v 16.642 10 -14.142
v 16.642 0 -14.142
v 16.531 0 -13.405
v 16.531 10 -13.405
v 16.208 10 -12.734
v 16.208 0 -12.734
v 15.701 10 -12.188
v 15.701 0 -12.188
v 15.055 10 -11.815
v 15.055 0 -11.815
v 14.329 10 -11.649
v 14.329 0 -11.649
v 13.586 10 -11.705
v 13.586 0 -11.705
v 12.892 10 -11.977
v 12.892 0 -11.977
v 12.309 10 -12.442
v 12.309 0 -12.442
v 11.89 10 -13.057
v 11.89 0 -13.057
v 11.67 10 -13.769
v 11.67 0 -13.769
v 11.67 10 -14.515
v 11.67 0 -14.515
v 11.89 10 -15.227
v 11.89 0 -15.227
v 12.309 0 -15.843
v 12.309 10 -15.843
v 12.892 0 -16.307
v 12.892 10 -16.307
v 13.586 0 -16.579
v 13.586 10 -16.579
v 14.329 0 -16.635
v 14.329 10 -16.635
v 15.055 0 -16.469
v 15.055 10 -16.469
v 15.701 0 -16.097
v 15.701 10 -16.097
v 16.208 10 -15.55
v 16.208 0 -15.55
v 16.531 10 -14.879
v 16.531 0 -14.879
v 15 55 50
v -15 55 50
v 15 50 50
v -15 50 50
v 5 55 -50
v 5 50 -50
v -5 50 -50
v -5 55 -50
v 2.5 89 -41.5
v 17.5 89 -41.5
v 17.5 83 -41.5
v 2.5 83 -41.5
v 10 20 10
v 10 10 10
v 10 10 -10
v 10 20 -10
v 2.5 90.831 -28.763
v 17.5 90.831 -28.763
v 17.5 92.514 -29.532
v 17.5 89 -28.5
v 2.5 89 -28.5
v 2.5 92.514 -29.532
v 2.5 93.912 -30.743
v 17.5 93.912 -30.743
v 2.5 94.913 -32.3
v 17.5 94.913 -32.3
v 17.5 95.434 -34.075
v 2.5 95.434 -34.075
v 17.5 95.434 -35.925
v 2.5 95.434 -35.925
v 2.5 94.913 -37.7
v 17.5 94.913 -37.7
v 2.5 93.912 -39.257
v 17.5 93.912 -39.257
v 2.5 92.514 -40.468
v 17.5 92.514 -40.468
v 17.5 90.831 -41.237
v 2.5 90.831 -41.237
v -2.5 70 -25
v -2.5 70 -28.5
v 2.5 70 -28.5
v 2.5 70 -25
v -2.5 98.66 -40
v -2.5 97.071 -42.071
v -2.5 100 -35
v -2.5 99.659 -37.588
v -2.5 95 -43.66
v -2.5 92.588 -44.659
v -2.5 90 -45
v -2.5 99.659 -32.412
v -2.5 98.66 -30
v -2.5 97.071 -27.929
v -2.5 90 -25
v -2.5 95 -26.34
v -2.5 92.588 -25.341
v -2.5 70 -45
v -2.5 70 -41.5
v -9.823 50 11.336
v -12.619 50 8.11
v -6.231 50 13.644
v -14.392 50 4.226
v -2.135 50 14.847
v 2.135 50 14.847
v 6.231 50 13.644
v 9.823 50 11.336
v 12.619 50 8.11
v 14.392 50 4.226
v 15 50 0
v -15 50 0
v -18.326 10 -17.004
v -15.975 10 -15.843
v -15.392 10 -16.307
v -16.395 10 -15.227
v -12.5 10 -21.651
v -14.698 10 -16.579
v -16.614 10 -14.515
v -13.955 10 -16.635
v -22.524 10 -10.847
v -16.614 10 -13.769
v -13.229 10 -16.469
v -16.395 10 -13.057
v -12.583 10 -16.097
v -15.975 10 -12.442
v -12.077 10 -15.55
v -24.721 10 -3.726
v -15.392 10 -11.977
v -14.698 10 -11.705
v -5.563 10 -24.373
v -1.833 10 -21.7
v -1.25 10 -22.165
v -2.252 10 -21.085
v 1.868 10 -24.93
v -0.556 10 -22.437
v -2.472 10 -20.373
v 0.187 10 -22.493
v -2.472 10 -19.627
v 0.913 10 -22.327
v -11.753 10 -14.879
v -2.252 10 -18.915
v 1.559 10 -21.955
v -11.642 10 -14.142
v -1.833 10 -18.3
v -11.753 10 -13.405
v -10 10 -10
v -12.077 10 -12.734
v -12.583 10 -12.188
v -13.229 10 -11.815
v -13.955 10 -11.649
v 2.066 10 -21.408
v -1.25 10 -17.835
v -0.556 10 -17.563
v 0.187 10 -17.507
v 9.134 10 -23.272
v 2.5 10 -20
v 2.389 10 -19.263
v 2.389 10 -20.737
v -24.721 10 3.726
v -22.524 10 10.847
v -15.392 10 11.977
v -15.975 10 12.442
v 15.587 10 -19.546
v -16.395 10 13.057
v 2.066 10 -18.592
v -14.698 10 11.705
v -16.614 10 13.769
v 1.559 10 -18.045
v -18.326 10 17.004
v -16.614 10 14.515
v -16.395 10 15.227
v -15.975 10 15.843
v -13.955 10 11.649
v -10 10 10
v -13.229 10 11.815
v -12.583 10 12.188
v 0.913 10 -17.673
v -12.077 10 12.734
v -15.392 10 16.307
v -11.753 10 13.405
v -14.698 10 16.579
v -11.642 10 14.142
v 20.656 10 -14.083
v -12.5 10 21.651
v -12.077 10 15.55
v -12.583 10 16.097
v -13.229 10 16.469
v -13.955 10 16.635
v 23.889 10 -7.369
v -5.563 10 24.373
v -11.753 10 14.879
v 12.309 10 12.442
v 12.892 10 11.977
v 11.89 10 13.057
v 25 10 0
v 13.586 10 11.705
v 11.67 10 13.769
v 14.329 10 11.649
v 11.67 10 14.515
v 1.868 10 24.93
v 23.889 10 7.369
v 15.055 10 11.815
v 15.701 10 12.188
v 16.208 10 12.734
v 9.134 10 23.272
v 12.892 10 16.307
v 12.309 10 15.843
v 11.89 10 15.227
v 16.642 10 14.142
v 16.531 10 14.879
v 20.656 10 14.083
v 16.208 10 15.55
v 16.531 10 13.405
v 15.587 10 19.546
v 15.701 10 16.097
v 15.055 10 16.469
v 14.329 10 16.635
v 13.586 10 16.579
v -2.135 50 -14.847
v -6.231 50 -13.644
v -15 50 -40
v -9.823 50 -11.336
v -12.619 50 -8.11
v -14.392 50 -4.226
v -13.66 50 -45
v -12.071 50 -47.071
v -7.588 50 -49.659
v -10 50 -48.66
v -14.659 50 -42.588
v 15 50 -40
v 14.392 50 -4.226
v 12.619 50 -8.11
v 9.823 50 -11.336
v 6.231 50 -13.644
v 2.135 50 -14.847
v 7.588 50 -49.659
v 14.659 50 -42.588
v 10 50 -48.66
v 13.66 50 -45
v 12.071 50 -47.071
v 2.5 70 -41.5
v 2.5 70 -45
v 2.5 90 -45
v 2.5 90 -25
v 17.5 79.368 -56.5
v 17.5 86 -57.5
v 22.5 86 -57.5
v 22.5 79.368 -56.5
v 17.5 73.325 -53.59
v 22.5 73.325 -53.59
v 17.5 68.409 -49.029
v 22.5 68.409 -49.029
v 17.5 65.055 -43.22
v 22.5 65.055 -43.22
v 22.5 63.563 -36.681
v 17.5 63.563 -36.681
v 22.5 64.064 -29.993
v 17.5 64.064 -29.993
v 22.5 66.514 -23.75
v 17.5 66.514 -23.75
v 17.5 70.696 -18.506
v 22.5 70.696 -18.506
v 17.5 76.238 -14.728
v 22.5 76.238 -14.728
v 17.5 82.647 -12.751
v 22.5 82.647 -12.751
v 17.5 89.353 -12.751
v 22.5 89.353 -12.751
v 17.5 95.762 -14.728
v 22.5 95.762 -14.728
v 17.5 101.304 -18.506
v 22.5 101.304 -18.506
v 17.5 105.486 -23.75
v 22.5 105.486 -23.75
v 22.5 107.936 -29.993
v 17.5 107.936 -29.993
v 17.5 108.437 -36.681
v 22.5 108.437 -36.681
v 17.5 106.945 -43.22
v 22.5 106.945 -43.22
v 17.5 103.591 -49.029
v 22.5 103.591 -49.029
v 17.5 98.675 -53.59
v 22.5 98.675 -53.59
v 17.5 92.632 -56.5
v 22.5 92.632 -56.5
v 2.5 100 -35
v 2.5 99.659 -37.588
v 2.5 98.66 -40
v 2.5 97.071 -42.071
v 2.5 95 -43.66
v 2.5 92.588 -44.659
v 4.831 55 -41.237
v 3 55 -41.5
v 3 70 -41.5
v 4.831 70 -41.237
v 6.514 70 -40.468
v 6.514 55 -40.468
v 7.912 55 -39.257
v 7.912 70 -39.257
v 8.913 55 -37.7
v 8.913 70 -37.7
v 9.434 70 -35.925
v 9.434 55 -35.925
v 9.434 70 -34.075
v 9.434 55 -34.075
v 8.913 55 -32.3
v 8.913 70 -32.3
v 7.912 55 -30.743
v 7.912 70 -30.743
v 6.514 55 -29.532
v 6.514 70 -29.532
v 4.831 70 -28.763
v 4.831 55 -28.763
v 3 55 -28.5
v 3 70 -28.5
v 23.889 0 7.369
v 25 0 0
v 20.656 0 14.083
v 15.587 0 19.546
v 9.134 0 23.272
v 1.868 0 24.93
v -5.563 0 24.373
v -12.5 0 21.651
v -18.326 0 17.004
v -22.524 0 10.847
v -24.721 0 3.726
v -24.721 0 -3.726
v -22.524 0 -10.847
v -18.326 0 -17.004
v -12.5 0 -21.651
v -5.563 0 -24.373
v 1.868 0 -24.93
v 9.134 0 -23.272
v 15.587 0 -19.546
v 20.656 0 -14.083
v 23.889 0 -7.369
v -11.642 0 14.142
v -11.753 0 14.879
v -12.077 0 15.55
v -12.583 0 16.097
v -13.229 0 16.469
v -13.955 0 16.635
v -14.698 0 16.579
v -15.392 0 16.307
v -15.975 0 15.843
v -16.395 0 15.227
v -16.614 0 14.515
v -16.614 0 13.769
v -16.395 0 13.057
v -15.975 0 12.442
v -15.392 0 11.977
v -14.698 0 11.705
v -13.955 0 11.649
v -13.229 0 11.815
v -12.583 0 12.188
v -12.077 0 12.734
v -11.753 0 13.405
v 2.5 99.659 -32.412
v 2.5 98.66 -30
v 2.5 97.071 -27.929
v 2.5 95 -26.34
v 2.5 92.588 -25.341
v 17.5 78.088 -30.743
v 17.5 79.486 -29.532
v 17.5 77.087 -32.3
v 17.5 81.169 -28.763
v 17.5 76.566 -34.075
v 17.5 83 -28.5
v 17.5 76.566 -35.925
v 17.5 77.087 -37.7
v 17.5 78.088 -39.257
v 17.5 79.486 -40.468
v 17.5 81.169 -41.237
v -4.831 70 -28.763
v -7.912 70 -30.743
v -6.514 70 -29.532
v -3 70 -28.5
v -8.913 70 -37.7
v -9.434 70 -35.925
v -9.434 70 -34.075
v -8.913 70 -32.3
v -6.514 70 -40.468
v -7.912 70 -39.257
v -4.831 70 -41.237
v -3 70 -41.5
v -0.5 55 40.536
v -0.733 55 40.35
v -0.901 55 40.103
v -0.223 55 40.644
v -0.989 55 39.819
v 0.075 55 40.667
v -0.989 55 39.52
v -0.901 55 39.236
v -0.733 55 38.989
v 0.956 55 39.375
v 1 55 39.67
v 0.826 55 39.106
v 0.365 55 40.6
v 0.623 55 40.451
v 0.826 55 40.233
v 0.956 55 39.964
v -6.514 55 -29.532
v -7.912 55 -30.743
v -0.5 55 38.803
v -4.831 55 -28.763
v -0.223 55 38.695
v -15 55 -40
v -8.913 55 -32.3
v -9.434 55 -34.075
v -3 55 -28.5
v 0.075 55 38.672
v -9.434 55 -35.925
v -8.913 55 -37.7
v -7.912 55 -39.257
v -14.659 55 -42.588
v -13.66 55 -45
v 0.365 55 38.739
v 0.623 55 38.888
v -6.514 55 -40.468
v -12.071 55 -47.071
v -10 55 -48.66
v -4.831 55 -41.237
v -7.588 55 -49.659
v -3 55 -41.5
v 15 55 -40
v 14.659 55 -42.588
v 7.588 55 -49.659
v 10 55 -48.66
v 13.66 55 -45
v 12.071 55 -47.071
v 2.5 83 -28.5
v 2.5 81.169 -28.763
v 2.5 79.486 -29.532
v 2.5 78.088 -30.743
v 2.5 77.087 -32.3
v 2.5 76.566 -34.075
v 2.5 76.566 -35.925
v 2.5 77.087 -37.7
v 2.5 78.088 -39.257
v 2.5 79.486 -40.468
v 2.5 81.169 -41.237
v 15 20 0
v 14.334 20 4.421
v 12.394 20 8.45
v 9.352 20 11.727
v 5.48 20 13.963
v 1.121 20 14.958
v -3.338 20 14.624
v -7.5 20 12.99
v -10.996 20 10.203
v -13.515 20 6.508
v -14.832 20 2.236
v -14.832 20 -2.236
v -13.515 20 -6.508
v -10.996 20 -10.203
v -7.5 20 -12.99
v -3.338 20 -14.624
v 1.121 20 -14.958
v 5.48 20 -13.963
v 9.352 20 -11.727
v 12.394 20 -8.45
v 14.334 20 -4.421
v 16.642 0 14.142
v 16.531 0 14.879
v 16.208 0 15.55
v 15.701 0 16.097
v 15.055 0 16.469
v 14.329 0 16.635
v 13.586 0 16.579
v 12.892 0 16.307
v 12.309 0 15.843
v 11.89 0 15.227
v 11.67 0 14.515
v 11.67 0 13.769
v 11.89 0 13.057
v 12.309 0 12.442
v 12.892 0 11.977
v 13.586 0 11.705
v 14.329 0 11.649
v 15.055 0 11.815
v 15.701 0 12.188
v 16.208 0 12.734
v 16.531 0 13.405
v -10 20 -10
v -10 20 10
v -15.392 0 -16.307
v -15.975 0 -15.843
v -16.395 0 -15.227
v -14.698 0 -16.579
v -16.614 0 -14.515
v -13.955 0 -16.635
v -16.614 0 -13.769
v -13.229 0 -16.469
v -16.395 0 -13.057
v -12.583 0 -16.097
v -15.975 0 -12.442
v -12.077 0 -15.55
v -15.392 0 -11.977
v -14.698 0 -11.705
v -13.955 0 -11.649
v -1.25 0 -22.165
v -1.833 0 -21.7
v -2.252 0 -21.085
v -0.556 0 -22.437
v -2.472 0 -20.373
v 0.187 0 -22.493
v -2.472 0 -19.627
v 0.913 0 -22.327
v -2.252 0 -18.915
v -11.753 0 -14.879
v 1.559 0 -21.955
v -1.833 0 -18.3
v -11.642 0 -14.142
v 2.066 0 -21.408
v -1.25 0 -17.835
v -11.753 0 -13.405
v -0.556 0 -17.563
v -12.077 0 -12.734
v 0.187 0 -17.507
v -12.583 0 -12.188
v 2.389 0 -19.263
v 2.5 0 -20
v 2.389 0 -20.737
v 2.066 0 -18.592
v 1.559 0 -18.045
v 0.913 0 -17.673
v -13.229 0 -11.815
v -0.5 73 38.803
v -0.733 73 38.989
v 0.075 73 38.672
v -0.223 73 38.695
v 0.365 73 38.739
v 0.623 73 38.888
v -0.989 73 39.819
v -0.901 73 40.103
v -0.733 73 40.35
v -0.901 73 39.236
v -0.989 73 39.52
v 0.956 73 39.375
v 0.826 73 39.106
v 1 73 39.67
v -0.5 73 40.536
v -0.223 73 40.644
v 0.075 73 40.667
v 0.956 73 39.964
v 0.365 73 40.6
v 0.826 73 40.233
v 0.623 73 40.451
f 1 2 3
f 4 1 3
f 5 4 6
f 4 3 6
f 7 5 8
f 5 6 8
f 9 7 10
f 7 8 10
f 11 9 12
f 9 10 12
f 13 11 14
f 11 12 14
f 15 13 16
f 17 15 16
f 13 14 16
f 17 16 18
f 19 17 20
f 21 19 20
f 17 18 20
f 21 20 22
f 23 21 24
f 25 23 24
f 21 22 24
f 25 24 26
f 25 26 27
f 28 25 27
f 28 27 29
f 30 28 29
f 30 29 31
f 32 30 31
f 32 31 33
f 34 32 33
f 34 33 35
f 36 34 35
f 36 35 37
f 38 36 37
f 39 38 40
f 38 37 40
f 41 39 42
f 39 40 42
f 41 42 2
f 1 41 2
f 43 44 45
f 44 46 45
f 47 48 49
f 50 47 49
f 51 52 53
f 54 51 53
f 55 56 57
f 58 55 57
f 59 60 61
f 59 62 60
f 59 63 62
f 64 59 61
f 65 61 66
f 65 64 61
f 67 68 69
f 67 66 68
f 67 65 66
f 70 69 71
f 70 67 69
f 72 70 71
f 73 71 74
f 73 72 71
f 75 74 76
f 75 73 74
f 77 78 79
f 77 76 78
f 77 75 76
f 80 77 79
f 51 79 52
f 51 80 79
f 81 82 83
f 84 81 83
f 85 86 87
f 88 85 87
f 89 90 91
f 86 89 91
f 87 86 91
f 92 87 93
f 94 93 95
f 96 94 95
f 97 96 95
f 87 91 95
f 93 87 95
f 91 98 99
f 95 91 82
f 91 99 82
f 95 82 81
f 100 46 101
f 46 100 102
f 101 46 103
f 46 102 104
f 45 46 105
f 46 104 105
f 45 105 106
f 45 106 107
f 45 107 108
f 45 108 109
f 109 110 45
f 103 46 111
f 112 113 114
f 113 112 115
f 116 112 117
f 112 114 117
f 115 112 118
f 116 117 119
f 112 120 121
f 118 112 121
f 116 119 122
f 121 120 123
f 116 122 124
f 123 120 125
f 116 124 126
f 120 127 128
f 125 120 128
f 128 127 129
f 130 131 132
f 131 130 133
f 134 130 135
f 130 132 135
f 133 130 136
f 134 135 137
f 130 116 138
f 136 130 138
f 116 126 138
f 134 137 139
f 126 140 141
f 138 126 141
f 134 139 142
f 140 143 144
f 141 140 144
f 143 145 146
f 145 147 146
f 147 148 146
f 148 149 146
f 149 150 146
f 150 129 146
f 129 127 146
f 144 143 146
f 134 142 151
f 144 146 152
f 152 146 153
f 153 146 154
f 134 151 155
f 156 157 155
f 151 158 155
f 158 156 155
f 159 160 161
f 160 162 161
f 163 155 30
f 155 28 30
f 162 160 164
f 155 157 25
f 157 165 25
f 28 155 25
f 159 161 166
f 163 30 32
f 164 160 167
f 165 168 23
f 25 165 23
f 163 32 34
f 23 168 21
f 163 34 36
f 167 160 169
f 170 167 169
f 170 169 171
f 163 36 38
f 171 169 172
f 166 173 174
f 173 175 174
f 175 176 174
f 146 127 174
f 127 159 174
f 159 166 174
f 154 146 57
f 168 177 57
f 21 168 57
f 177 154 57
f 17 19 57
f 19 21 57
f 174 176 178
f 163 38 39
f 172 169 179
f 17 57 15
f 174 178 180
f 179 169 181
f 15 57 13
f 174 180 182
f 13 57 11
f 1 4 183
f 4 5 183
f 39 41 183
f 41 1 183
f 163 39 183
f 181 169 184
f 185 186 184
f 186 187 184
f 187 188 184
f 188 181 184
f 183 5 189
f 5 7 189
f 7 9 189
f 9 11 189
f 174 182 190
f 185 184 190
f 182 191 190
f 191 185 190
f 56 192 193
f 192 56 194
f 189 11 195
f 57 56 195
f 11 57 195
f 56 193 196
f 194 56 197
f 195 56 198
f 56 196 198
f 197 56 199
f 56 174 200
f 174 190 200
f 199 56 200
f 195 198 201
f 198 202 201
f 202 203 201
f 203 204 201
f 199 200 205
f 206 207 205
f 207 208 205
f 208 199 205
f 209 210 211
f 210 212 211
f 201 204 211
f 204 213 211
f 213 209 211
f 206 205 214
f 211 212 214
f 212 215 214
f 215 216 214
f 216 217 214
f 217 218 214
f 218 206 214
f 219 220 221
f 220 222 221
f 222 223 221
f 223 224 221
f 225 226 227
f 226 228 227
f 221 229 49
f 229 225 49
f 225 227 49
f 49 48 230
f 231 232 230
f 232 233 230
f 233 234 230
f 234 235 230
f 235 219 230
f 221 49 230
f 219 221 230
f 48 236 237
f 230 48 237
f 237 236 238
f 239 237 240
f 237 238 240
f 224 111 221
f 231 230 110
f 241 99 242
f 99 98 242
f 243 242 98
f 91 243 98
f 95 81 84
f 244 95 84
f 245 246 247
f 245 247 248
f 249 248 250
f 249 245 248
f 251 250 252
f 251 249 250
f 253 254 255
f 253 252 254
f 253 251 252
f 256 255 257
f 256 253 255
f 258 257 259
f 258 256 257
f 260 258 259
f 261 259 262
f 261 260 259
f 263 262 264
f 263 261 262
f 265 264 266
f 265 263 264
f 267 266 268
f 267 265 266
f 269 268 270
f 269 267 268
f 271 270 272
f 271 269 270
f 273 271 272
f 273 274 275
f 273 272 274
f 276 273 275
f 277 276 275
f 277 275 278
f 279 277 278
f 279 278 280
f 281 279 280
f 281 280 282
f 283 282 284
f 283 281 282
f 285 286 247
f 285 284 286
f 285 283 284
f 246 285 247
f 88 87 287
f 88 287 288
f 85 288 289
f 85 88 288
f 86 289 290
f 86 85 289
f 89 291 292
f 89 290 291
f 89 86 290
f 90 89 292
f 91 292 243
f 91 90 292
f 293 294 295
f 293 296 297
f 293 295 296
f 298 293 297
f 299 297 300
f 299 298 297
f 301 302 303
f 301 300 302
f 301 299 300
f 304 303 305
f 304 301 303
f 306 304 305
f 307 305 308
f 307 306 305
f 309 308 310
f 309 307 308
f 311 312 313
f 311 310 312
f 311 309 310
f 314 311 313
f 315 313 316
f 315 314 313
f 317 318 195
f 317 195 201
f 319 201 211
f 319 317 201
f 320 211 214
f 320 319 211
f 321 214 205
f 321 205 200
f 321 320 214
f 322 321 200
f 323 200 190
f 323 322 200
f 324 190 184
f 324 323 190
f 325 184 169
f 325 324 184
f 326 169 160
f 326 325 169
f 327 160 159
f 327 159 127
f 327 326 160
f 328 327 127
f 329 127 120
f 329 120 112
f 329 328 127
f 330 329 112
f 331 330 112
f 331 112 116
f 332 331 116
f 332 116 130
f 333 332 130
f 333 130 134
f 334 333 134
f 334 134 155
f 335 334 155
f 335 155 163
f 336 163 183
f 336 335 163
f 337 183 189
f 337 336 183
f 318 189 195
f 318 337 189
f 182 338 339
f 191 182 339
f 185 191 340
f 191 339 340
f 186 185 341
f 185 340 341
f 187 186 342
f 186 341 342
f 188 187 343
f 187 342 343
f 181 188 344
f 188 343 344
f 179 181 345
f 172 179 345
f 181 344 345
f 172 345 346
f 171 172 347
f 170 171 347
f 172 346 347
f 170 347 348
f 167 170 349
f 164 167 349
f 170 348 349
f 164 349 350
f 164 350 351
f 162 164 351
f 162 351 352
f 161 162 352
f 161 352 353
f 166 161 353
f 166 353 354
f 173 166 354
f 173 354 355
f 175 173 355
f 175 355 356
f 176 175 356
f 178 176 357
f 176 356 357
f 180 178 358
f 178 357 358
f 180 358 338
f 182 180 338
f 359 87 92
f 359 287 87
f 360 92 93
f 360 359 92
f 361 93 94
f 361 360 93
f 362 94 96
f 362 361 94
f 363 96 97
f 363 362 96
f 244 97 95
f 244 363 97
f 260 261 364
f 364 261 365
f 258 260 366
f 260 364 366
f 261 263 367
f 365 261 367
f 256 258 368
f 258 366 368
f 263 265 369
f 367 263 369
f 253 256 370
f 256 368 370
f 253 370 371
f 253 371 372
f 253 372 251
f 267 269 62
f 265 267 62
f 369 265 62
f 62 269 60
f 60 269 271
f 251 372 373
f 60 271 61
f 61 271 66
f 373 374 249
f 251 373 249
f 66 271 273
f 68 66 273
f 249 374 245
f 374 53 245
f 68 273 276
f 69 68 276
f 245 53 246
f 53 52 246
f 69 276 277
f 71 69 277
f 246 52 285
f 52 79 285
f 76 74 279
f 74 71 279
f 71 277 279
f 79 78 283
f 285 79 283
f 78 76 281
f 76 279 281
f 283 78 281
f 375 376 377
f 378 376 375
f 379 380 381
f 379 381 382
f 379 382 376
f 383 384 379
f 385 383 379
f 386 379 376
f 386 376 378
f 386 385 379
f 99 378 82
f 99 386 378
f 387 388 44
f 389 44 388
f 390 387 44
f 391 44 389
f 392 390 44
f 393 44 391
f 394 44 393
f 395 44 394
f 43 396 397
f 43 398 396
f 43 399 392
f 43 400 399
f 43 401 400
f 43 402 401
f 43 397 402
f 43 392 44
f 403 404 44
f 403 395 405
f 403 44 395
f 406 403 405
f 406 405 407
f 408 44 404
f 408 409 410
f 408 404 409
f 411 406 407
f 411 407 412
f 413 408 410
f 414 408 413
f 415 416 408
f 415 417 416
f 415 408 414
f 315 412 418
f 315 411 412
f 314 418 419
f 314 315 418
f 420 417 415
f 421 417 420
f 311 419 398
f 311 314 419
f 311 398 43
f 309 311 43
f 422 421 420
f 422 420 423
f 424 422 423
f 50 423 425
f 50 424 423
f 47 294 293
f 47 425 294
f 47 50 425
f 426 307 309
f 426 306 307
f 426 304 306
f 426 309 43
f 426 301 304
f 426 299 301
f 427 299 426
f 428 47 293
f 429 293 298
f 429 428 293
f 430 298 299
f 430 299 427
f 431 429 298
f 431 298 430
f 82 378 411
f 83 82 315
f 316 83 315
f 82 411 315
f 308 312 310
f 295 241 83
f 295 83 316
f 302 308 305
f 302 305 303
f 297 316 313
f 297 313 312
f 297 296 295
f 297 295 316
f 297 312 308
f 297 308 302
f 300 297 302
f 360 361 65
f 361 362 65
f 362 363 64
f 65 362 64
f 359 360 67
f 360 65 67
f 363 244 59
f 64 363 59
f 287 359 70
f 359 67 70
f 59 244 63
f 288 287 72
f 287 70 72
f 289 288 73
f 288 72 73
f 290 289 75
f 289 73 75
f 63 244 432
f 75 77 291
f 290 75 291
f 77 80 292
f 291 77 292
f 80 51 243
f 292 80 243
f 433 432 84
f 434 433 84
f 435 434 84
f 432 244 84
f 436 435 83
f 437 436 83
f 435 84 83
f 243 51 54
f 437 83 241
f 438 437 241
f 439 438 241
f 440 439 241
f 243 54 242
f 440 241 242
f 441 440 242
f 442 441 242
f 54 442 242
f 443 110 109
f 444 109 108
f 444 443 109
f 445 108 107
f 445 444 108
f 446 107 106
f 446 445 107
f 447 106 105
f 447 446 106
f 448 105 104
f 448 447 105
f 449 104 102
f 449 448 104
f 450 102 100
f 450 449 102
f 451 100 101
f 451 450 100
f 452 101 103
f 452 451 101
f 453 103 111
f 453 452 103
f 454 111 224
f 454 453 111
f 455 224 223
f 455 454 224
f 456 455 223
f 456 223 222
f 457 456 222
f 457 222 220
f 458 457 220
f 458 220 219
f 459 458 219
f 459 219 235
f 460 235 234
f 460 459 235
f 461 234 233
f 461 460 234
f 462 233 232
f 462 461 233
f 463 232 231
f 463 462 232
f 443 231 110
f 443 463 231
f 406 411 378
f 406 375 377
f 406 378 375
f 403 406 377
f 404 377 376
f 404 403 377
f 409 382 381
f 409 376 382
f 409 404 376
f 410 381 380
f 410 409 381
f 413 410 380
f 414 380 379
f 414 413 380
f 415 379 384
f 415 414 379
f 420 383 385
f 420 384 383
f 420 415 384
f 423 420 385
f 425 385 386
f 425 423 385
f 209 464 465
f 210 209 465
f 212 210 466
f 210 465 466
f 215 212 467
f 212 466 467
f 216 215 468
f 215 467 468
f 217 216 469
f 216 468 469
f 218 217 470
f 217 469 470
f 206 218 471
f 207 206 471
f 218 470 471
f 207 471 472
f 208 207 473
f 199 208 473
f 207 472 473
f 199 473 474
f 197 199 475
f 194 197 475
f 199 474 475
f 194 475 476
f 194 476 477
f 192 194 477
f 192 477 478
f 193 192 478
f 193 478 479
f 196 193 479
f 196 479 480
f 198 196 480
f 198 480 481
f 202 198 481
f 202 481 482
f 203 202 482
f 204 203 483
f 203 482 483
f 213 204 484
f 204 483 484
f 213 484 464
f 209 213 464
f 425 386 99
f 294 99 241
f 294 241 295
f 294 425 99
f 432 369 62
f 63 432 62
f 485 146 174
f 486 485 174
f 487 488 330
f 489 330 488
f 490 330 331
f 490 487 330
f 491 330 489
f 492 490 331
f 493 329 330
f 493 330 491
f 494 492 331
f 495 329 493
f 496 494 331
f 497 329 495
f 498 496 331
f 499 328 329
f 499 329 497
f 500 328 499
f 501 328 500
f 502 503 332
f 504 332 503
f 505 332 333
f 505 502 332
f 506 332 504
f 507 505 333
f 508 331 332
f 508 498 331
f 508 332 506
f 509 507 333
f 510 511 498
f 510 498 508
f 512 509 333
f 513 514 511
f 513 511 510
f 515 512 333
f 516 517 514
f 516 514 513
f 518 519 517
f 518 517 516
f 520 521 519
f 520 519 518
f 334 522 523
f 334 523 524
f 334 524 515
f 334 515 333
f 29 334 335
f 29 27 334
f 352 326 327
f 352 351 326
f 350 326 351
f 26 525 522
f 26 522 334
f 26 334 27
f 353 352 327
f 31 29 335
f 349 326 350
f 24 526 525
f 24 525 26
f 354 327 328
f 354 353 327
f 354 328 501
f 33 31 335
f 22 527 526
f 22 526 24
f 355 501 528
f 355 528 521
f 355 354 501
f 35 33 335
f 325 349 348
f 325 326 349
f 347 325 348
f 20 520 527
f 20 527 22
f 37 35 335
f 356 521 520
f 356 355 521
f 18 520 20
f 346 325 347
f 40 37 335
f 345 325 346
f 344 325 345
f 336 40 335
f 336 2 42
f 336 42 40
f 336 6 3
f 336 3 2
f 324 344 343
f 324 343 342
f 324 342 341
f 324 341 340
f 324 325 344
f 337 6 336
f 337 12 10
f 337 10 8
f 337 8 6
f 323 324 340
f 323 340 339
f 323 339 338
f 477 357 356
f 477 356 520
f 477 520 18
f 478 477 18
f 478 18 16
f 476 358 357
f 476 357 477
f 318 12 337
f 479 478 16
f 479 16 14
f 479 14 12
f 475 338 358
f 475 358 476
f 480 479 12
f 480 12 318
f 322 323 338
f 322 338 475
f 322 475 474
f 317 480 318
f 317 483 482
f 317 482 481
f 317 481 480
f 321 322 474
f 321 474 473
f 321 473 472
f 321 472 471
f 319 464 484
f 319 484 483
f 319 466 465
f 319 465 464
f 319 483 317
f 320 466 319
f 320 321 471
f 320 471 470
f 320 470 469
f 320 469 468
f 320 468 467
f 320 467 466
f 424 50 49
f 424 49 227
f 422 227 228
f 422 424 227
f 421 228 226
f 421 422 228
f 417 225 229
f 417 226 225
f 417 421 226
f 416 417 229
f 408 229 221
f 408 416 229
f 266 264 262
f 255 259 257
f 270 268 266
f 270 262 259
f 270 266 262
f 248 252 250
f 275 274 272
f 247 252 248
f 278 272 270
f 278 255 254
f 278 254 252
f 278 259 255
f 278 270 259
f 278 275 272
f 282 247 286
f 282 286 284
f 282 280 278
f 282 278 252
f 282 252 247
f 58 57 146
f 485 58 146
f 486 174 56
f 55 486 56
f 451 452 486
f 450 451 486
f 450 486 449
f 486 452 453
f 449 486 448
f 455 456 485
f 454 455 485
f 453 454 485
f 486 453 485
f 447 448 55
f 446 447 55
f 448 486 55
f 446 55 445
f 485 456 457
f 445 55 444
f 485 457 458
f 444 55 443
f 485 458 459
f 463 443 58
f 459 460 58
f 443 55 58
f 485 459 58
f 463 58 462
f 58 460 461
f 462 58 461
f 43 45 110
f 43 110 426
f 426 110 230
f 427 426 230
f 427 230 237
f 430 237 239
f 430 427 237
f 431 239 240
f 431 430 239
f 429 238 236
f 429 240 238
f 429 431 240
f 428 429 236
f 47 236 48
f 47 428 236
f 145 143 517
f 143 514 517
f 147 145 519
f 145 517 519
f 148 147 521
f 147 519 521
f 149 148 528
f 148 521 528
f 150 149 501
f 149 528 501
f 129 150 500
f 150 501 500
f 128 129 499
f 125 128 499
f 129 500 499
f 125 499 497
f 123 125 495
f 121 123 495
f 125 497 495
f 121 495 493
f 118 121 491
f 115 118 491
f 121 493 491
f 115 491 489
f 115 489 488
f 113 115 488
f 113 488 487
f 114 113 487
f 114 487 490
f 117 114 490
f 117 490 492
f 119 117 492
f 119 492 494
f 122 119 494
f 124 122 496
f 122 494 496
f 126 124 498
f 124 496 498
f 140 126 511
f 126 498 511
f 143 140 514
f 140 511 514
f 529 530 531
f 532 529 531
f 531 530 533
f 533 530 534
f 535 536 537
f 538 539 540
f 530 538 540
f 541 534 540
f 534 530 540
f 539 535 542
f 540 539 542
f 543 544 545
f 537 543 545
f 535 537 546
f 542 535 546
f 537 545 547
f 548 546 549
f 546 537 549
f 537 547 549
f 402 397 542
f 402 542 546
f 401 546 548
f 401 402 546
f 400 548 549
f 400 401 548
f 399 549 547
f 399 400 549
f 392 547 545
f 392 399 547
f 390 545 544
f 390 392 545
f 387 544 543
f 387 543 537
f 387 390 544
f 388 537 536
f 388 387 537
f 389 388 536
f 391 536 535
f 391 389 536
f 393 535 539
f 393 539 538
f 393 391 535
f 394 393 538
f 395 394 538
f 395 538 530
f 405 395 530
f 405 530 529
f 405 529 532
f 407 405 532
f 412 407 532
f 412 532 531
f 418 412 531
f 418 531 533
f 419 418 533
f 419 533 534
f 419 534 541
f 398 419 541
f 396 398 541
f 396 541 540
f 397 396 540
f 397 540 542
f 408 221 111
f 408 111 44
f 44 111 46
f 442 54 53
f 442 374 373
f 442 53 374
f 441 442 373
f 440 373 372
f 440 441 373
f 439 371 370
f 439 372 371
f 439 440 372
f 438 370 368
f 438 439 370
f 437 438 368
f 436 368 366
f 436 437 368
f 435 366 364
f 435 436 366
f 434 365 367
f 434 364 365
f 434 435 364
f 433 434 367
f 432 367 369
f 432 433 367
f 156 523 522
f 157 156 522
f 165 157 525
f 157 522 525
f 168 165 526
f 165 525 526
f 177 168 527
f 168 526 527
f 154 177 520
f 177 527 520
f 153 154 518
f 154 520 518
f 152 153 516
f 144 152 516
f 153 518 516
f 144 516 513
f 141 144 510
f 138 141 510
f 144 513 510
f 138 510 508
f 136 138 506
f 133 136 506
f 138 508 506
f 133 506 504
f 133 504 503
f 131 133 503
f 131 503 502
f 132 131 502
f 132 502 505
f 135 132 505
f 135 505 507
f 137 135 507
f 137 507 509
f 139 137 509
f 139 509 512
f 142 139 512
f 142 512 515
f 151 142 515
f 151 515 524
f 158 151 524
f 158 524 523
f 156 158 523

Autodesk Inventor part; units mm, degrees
ref_plane "YZ Plane" through (0, 0, 0) normal (1, 0, 0) x (0, 1, 0)
ref_plane "XZ Plane" through (0, 0, 0) normal (0, 1, 0) x (-1, 0, 0)
ref_plane "XY Plane" through (0, 0, 0) normal (0, 0, 1) x (1, 0, 0)
sketch "Sketch1" plane through (0, 0, 0) normal (0, 1, 0) x (-1, 0, 0)
  line L0 (10, 10) -> (-10, 10)
  line L1 (-10, 10) -> (-10, -10)
  line L2 (-10, -10) -> (10, -10)
  line L3 (10, -10) -> (10, 10)
  line L4 (10, 10) -> (-10, -10) construction
  line L5 (-10, 10) -> (10, -10) construction
  point P0 (0, 0)
  dimension "d0" = 20
  dimension "d1" = 20
extrude "Extrusion1" add sketch "Sketch1" along normal blind 20
sketch "Sketch2" plane through (0, 20, 0) normal (0, 1, 0) x (1, 0, 0)
  circle A0 centre (0, 0) radius 15
  dimension "d4" = 30
extrude "Extrusion2" add sketch "Sketch2" along normal blind 30
sketch "Sketch3" plane through (0, 50, 0) normal (0, 1, 0) x (1, 0, 0)
  line L0 (-15, -50) -> (15, -50)
  line L1 (15, -50) -> (15, 50)
  line L2 (15, 50) -> (-15, 50)
  line L3 (-15, 50) -> (-15, -50)
  line L4 (-15, -50) -> (15, 50) construction
  line L5 (15, -50) -> (-15, 50) construction
  point P0 (0, 0)
  dimension "d7" = 30
  dimension "d8" = 100
extrude "Extrusion3" add sketch "Sketch3" along normal blind 5
sketch "Sketch4" plane through (0, 55, 0) normal (0, 1, 0) x (1, 0, 0)
  arc A0 (-3, 41.5) -> (-3, 28.5) centre (-3, 35) ccw
  arc A1 (3, 28.5) -> (3, 41.5) centre (3, 35) ccw
  line L0 (-3, 28.5) -> (3, 28.5)
  line L1 (-3, 41.5) -> (3, 41.5)
  point P0 (0, 0)
  dimension "d11" = 13
  dimension "d12" = 13
  dimension "d13" = 3
  dimension "d14" = 3
  dimension "d15" = 35
extrude "Extrusion4" cut sketch "Sketch4" against normal blind 5
fillet "Fillet1" radius 10 2 edges at (-15, 52.5, -50) (15, 52.5, -50)
sketch "Sketch5" plane through (0, 55, 0) normal (0, 1, 0) x (1, 0, 0)
  circle A0 centre (0, -39.6695) radius 1
  point P0 (0, 0)
  dimension "d19" = 2
extrude "Extrusion5" cut sketch "Sketch5" against normal blind 5
sketch "Sketch6" plane through (0, 0, 0) normal (0, -1, 0) x (1, 0, 0)
  circle A0 centre (-14.1421, 14.1421) radius 2.5
  circle A1 centre (-14.1421, -14.1421) radius 2.5
  line L0 (0, 0) -> (-14.1421, 14.1421)
  line L1 (0, 0) -> (0, -20)
  line L2 (0, 0) -> (-14.1421, -14.1421)
  circle A2 centre (0, -20) radius 2.5
  circle A3 centre (0, 0) radius 25
  line L3 (0, 0) -> (14.1421, 14.1421)
  circle A4 centre (14.1421, 14.1421) radius 2.5
  line L4 (0, 0) -> (14.1421, -14.1421)
  circle A5 centre (14.1421, -14.1421) radius 2.5
  line L5 (-10, 10) -> (10, 10)
  line L6 (10, 10) -> (10, -10)
  line L7 (10, -10) -> (-10, -10)
  line L8 (-10, -10) -> (-10, 10)
  line L9 (-10, 10) -> (10, -10) construction
  line L10 (10, 10) -> (-10, -10) construction
  dimension "d22" = 20
  dimension "d23" = 20
  dimension "d24" = 135
  dimension "d25" = 5
  dimension "d26" = 5
  dimension "d27" = 20
  dimension "d28" = 90
  dimension "d29" = 5
  dimension "d30" = 20
  dimension "d31" = 90
  dimension "d32" = 5
  dimension "d33" = 20
  dimension "d34" = 90
  dimension "d35" = 5
  dimension "d36" = 20
  dimension "d37" = 20
extrude "Extrusion6" add sketch "Sketch6" against normal blind 10
sketch "Sketch7" plane through (0, 55, 0) normal (0, 1, 0) x (1, 0, 0)
  arc A0 (-3, 41.5) -> (-3, 28.5) centre (-3, 35) ccw
  arc A1 (3, 28.5) -> (3, 41.5) centre (3, 35) ccw
  line L0 (-3, 28.5) -> (3, 28.5)
  line L1 (-3, 41.5) -> (3, 41.5)
  point P0 (0, 0)
  dimension "d40" = 13
  dimension "d41" = 13
extrude "Extrusion7" add sketch "Sketch7" along normal blind 15 and the other way blind 5
sketch "Sketch8" plane through (0, 70, 0) normal (0, 1, 0) x (1, 0, 0)
  line L0 (-2.5, 25) -> (2.5, 25)
  line L1 (2.5, 25) -> (2.5, 45)
  line L2 (2.5, 45) -> (-2.5, 45)
  line L3 (-2.5, 45) -> (-2.5, 25)
  line L4 (-2.5, 25) -> (2.5, 45) construction
  line L5 (2.5, 25) -> (-2.5, 45) construction
  arc A0 (-2.8422, 41.5) -> (-2.8422, 28.5) centre (-2.8422, 35) ccw construction
  arc A1 (3.1578, 28.5) -> (3.1578, 41.5) centre (3.1578, 35) ccw construction
  line L6 (-2.8422, 28.5) -> (3.1578, 28.5) construction
  line L7 (-2.8422, 41.5) -> (3.1578, 41.5) construction
  point P0 (0, 0)
  point P1 (0, 35)
  point P2 (0, 35)
  point P3 (0, 35)
  dimension "d46" = 5
  dimension "d47" = 20
  dimension "d48" = 13
  dimension "d49" = 13
  dimension "d50" = 35
  dimension "d51" = 0
  dimension "d52" = 0
extrude "Extrusion8" add sketch "Sketch8" along normal blind 30
sketch "Sketch9" plane through (2.5, 70, -25) normal (1, 0, 0) x (0, 0, -1)
  line L0 (0, 0) -> (0, 30) construction
  line L1 (16.5, 0) -> (20, 0) projected
  line L2 (0, 30) -> (20, 30) construction
  line L3 (20, 30) -> (20, 0) construction
  line L4 (20, 0) -> (0, 0) construction
  line L5 (0, 0) -> (0, 30) construction
  arc A0 (16.5, 19) -> (3.5, 19) centre (10, 19) ccw
  arc A1 (3.5, 13) -> (16.5, 13) centre (10, 13) ccw
  line L6 (3.5, 13) -> (3.5, 19)
  line L7 (16.5, 19) -> (16.5, 13)
  point P0 (-25, -70)
  point P1 (18.25, 0)
  dimension "d55" = 13
  dimension "d56" = 13
  dimension "d57" = 6
  dimension "d58" = 13
extrude "Extrusion9" cut sketch "Sketch9" against normal blind 30
fillet "Fillet2" radius 10 2 edges at (0, 100, -45) (0, 100, -25)
sketch "Sketch10" plane through (0, 50, 0) normal (0, -1, 0) x (1, 0, 0)
  circle A0 centre (0, 39.6695) radius 1 projected
  line L0 (0, 0) -> (0, 39.6695) construction
  circle A1 centre (0, 39.6695) radius 1
extrude "Extrusion10" add sketch "Sketch10" against normal blind 23
sketch "Sketch11" plane through (2.5, 70, -25) normal (1, 0, 0) x (0, 0, -1)
  arc A0 (16.5, 19) -> (3.5, 19) centre (10, 19) ccw
  arc A1 (3.5, 13) -> (16.5, 13) centre (10, 13) ccw
  line L0 (3.5, 13) -> (3.5, 19)
  line L1 (16.5, 19) -> (16.5, 13)
  point P0 (-25, -70)
  dimension "d65" = 13
  dimension "d66" = 13
  dimension "d67" = 6
extrude "Extrusion11" add sketch "Sketch11" along normal blind 15 and the other way blind 5
sketch "Sketch13" plane through (17.5, 70, -25) normal (1, 0, 0) x (0, 0, -1)
  line L0 (3.5, 13) -> (3.5, 19) construction
  arc A0 (3.5, 13) -> (16.5, 13) centre (10, 13) ccw projected
  line L1 (3.5, 19) -> (16.5, 19) construction
  line L2 (16.5, 19) -> (16.5, 13) construction
  line L3 (16.5, 13) -> (3.5, 13) construction
  line L4 (3.5, 13) -> (3.5, 19) construction
  circle A1 centre (10, 16) radius 22.5
  point P0 (-25, -70)
  dimension "d76" = 45
extrude "Extrusion13" add sketch "Sketch13" along normal blind 5
properties part number "herramienta5"
